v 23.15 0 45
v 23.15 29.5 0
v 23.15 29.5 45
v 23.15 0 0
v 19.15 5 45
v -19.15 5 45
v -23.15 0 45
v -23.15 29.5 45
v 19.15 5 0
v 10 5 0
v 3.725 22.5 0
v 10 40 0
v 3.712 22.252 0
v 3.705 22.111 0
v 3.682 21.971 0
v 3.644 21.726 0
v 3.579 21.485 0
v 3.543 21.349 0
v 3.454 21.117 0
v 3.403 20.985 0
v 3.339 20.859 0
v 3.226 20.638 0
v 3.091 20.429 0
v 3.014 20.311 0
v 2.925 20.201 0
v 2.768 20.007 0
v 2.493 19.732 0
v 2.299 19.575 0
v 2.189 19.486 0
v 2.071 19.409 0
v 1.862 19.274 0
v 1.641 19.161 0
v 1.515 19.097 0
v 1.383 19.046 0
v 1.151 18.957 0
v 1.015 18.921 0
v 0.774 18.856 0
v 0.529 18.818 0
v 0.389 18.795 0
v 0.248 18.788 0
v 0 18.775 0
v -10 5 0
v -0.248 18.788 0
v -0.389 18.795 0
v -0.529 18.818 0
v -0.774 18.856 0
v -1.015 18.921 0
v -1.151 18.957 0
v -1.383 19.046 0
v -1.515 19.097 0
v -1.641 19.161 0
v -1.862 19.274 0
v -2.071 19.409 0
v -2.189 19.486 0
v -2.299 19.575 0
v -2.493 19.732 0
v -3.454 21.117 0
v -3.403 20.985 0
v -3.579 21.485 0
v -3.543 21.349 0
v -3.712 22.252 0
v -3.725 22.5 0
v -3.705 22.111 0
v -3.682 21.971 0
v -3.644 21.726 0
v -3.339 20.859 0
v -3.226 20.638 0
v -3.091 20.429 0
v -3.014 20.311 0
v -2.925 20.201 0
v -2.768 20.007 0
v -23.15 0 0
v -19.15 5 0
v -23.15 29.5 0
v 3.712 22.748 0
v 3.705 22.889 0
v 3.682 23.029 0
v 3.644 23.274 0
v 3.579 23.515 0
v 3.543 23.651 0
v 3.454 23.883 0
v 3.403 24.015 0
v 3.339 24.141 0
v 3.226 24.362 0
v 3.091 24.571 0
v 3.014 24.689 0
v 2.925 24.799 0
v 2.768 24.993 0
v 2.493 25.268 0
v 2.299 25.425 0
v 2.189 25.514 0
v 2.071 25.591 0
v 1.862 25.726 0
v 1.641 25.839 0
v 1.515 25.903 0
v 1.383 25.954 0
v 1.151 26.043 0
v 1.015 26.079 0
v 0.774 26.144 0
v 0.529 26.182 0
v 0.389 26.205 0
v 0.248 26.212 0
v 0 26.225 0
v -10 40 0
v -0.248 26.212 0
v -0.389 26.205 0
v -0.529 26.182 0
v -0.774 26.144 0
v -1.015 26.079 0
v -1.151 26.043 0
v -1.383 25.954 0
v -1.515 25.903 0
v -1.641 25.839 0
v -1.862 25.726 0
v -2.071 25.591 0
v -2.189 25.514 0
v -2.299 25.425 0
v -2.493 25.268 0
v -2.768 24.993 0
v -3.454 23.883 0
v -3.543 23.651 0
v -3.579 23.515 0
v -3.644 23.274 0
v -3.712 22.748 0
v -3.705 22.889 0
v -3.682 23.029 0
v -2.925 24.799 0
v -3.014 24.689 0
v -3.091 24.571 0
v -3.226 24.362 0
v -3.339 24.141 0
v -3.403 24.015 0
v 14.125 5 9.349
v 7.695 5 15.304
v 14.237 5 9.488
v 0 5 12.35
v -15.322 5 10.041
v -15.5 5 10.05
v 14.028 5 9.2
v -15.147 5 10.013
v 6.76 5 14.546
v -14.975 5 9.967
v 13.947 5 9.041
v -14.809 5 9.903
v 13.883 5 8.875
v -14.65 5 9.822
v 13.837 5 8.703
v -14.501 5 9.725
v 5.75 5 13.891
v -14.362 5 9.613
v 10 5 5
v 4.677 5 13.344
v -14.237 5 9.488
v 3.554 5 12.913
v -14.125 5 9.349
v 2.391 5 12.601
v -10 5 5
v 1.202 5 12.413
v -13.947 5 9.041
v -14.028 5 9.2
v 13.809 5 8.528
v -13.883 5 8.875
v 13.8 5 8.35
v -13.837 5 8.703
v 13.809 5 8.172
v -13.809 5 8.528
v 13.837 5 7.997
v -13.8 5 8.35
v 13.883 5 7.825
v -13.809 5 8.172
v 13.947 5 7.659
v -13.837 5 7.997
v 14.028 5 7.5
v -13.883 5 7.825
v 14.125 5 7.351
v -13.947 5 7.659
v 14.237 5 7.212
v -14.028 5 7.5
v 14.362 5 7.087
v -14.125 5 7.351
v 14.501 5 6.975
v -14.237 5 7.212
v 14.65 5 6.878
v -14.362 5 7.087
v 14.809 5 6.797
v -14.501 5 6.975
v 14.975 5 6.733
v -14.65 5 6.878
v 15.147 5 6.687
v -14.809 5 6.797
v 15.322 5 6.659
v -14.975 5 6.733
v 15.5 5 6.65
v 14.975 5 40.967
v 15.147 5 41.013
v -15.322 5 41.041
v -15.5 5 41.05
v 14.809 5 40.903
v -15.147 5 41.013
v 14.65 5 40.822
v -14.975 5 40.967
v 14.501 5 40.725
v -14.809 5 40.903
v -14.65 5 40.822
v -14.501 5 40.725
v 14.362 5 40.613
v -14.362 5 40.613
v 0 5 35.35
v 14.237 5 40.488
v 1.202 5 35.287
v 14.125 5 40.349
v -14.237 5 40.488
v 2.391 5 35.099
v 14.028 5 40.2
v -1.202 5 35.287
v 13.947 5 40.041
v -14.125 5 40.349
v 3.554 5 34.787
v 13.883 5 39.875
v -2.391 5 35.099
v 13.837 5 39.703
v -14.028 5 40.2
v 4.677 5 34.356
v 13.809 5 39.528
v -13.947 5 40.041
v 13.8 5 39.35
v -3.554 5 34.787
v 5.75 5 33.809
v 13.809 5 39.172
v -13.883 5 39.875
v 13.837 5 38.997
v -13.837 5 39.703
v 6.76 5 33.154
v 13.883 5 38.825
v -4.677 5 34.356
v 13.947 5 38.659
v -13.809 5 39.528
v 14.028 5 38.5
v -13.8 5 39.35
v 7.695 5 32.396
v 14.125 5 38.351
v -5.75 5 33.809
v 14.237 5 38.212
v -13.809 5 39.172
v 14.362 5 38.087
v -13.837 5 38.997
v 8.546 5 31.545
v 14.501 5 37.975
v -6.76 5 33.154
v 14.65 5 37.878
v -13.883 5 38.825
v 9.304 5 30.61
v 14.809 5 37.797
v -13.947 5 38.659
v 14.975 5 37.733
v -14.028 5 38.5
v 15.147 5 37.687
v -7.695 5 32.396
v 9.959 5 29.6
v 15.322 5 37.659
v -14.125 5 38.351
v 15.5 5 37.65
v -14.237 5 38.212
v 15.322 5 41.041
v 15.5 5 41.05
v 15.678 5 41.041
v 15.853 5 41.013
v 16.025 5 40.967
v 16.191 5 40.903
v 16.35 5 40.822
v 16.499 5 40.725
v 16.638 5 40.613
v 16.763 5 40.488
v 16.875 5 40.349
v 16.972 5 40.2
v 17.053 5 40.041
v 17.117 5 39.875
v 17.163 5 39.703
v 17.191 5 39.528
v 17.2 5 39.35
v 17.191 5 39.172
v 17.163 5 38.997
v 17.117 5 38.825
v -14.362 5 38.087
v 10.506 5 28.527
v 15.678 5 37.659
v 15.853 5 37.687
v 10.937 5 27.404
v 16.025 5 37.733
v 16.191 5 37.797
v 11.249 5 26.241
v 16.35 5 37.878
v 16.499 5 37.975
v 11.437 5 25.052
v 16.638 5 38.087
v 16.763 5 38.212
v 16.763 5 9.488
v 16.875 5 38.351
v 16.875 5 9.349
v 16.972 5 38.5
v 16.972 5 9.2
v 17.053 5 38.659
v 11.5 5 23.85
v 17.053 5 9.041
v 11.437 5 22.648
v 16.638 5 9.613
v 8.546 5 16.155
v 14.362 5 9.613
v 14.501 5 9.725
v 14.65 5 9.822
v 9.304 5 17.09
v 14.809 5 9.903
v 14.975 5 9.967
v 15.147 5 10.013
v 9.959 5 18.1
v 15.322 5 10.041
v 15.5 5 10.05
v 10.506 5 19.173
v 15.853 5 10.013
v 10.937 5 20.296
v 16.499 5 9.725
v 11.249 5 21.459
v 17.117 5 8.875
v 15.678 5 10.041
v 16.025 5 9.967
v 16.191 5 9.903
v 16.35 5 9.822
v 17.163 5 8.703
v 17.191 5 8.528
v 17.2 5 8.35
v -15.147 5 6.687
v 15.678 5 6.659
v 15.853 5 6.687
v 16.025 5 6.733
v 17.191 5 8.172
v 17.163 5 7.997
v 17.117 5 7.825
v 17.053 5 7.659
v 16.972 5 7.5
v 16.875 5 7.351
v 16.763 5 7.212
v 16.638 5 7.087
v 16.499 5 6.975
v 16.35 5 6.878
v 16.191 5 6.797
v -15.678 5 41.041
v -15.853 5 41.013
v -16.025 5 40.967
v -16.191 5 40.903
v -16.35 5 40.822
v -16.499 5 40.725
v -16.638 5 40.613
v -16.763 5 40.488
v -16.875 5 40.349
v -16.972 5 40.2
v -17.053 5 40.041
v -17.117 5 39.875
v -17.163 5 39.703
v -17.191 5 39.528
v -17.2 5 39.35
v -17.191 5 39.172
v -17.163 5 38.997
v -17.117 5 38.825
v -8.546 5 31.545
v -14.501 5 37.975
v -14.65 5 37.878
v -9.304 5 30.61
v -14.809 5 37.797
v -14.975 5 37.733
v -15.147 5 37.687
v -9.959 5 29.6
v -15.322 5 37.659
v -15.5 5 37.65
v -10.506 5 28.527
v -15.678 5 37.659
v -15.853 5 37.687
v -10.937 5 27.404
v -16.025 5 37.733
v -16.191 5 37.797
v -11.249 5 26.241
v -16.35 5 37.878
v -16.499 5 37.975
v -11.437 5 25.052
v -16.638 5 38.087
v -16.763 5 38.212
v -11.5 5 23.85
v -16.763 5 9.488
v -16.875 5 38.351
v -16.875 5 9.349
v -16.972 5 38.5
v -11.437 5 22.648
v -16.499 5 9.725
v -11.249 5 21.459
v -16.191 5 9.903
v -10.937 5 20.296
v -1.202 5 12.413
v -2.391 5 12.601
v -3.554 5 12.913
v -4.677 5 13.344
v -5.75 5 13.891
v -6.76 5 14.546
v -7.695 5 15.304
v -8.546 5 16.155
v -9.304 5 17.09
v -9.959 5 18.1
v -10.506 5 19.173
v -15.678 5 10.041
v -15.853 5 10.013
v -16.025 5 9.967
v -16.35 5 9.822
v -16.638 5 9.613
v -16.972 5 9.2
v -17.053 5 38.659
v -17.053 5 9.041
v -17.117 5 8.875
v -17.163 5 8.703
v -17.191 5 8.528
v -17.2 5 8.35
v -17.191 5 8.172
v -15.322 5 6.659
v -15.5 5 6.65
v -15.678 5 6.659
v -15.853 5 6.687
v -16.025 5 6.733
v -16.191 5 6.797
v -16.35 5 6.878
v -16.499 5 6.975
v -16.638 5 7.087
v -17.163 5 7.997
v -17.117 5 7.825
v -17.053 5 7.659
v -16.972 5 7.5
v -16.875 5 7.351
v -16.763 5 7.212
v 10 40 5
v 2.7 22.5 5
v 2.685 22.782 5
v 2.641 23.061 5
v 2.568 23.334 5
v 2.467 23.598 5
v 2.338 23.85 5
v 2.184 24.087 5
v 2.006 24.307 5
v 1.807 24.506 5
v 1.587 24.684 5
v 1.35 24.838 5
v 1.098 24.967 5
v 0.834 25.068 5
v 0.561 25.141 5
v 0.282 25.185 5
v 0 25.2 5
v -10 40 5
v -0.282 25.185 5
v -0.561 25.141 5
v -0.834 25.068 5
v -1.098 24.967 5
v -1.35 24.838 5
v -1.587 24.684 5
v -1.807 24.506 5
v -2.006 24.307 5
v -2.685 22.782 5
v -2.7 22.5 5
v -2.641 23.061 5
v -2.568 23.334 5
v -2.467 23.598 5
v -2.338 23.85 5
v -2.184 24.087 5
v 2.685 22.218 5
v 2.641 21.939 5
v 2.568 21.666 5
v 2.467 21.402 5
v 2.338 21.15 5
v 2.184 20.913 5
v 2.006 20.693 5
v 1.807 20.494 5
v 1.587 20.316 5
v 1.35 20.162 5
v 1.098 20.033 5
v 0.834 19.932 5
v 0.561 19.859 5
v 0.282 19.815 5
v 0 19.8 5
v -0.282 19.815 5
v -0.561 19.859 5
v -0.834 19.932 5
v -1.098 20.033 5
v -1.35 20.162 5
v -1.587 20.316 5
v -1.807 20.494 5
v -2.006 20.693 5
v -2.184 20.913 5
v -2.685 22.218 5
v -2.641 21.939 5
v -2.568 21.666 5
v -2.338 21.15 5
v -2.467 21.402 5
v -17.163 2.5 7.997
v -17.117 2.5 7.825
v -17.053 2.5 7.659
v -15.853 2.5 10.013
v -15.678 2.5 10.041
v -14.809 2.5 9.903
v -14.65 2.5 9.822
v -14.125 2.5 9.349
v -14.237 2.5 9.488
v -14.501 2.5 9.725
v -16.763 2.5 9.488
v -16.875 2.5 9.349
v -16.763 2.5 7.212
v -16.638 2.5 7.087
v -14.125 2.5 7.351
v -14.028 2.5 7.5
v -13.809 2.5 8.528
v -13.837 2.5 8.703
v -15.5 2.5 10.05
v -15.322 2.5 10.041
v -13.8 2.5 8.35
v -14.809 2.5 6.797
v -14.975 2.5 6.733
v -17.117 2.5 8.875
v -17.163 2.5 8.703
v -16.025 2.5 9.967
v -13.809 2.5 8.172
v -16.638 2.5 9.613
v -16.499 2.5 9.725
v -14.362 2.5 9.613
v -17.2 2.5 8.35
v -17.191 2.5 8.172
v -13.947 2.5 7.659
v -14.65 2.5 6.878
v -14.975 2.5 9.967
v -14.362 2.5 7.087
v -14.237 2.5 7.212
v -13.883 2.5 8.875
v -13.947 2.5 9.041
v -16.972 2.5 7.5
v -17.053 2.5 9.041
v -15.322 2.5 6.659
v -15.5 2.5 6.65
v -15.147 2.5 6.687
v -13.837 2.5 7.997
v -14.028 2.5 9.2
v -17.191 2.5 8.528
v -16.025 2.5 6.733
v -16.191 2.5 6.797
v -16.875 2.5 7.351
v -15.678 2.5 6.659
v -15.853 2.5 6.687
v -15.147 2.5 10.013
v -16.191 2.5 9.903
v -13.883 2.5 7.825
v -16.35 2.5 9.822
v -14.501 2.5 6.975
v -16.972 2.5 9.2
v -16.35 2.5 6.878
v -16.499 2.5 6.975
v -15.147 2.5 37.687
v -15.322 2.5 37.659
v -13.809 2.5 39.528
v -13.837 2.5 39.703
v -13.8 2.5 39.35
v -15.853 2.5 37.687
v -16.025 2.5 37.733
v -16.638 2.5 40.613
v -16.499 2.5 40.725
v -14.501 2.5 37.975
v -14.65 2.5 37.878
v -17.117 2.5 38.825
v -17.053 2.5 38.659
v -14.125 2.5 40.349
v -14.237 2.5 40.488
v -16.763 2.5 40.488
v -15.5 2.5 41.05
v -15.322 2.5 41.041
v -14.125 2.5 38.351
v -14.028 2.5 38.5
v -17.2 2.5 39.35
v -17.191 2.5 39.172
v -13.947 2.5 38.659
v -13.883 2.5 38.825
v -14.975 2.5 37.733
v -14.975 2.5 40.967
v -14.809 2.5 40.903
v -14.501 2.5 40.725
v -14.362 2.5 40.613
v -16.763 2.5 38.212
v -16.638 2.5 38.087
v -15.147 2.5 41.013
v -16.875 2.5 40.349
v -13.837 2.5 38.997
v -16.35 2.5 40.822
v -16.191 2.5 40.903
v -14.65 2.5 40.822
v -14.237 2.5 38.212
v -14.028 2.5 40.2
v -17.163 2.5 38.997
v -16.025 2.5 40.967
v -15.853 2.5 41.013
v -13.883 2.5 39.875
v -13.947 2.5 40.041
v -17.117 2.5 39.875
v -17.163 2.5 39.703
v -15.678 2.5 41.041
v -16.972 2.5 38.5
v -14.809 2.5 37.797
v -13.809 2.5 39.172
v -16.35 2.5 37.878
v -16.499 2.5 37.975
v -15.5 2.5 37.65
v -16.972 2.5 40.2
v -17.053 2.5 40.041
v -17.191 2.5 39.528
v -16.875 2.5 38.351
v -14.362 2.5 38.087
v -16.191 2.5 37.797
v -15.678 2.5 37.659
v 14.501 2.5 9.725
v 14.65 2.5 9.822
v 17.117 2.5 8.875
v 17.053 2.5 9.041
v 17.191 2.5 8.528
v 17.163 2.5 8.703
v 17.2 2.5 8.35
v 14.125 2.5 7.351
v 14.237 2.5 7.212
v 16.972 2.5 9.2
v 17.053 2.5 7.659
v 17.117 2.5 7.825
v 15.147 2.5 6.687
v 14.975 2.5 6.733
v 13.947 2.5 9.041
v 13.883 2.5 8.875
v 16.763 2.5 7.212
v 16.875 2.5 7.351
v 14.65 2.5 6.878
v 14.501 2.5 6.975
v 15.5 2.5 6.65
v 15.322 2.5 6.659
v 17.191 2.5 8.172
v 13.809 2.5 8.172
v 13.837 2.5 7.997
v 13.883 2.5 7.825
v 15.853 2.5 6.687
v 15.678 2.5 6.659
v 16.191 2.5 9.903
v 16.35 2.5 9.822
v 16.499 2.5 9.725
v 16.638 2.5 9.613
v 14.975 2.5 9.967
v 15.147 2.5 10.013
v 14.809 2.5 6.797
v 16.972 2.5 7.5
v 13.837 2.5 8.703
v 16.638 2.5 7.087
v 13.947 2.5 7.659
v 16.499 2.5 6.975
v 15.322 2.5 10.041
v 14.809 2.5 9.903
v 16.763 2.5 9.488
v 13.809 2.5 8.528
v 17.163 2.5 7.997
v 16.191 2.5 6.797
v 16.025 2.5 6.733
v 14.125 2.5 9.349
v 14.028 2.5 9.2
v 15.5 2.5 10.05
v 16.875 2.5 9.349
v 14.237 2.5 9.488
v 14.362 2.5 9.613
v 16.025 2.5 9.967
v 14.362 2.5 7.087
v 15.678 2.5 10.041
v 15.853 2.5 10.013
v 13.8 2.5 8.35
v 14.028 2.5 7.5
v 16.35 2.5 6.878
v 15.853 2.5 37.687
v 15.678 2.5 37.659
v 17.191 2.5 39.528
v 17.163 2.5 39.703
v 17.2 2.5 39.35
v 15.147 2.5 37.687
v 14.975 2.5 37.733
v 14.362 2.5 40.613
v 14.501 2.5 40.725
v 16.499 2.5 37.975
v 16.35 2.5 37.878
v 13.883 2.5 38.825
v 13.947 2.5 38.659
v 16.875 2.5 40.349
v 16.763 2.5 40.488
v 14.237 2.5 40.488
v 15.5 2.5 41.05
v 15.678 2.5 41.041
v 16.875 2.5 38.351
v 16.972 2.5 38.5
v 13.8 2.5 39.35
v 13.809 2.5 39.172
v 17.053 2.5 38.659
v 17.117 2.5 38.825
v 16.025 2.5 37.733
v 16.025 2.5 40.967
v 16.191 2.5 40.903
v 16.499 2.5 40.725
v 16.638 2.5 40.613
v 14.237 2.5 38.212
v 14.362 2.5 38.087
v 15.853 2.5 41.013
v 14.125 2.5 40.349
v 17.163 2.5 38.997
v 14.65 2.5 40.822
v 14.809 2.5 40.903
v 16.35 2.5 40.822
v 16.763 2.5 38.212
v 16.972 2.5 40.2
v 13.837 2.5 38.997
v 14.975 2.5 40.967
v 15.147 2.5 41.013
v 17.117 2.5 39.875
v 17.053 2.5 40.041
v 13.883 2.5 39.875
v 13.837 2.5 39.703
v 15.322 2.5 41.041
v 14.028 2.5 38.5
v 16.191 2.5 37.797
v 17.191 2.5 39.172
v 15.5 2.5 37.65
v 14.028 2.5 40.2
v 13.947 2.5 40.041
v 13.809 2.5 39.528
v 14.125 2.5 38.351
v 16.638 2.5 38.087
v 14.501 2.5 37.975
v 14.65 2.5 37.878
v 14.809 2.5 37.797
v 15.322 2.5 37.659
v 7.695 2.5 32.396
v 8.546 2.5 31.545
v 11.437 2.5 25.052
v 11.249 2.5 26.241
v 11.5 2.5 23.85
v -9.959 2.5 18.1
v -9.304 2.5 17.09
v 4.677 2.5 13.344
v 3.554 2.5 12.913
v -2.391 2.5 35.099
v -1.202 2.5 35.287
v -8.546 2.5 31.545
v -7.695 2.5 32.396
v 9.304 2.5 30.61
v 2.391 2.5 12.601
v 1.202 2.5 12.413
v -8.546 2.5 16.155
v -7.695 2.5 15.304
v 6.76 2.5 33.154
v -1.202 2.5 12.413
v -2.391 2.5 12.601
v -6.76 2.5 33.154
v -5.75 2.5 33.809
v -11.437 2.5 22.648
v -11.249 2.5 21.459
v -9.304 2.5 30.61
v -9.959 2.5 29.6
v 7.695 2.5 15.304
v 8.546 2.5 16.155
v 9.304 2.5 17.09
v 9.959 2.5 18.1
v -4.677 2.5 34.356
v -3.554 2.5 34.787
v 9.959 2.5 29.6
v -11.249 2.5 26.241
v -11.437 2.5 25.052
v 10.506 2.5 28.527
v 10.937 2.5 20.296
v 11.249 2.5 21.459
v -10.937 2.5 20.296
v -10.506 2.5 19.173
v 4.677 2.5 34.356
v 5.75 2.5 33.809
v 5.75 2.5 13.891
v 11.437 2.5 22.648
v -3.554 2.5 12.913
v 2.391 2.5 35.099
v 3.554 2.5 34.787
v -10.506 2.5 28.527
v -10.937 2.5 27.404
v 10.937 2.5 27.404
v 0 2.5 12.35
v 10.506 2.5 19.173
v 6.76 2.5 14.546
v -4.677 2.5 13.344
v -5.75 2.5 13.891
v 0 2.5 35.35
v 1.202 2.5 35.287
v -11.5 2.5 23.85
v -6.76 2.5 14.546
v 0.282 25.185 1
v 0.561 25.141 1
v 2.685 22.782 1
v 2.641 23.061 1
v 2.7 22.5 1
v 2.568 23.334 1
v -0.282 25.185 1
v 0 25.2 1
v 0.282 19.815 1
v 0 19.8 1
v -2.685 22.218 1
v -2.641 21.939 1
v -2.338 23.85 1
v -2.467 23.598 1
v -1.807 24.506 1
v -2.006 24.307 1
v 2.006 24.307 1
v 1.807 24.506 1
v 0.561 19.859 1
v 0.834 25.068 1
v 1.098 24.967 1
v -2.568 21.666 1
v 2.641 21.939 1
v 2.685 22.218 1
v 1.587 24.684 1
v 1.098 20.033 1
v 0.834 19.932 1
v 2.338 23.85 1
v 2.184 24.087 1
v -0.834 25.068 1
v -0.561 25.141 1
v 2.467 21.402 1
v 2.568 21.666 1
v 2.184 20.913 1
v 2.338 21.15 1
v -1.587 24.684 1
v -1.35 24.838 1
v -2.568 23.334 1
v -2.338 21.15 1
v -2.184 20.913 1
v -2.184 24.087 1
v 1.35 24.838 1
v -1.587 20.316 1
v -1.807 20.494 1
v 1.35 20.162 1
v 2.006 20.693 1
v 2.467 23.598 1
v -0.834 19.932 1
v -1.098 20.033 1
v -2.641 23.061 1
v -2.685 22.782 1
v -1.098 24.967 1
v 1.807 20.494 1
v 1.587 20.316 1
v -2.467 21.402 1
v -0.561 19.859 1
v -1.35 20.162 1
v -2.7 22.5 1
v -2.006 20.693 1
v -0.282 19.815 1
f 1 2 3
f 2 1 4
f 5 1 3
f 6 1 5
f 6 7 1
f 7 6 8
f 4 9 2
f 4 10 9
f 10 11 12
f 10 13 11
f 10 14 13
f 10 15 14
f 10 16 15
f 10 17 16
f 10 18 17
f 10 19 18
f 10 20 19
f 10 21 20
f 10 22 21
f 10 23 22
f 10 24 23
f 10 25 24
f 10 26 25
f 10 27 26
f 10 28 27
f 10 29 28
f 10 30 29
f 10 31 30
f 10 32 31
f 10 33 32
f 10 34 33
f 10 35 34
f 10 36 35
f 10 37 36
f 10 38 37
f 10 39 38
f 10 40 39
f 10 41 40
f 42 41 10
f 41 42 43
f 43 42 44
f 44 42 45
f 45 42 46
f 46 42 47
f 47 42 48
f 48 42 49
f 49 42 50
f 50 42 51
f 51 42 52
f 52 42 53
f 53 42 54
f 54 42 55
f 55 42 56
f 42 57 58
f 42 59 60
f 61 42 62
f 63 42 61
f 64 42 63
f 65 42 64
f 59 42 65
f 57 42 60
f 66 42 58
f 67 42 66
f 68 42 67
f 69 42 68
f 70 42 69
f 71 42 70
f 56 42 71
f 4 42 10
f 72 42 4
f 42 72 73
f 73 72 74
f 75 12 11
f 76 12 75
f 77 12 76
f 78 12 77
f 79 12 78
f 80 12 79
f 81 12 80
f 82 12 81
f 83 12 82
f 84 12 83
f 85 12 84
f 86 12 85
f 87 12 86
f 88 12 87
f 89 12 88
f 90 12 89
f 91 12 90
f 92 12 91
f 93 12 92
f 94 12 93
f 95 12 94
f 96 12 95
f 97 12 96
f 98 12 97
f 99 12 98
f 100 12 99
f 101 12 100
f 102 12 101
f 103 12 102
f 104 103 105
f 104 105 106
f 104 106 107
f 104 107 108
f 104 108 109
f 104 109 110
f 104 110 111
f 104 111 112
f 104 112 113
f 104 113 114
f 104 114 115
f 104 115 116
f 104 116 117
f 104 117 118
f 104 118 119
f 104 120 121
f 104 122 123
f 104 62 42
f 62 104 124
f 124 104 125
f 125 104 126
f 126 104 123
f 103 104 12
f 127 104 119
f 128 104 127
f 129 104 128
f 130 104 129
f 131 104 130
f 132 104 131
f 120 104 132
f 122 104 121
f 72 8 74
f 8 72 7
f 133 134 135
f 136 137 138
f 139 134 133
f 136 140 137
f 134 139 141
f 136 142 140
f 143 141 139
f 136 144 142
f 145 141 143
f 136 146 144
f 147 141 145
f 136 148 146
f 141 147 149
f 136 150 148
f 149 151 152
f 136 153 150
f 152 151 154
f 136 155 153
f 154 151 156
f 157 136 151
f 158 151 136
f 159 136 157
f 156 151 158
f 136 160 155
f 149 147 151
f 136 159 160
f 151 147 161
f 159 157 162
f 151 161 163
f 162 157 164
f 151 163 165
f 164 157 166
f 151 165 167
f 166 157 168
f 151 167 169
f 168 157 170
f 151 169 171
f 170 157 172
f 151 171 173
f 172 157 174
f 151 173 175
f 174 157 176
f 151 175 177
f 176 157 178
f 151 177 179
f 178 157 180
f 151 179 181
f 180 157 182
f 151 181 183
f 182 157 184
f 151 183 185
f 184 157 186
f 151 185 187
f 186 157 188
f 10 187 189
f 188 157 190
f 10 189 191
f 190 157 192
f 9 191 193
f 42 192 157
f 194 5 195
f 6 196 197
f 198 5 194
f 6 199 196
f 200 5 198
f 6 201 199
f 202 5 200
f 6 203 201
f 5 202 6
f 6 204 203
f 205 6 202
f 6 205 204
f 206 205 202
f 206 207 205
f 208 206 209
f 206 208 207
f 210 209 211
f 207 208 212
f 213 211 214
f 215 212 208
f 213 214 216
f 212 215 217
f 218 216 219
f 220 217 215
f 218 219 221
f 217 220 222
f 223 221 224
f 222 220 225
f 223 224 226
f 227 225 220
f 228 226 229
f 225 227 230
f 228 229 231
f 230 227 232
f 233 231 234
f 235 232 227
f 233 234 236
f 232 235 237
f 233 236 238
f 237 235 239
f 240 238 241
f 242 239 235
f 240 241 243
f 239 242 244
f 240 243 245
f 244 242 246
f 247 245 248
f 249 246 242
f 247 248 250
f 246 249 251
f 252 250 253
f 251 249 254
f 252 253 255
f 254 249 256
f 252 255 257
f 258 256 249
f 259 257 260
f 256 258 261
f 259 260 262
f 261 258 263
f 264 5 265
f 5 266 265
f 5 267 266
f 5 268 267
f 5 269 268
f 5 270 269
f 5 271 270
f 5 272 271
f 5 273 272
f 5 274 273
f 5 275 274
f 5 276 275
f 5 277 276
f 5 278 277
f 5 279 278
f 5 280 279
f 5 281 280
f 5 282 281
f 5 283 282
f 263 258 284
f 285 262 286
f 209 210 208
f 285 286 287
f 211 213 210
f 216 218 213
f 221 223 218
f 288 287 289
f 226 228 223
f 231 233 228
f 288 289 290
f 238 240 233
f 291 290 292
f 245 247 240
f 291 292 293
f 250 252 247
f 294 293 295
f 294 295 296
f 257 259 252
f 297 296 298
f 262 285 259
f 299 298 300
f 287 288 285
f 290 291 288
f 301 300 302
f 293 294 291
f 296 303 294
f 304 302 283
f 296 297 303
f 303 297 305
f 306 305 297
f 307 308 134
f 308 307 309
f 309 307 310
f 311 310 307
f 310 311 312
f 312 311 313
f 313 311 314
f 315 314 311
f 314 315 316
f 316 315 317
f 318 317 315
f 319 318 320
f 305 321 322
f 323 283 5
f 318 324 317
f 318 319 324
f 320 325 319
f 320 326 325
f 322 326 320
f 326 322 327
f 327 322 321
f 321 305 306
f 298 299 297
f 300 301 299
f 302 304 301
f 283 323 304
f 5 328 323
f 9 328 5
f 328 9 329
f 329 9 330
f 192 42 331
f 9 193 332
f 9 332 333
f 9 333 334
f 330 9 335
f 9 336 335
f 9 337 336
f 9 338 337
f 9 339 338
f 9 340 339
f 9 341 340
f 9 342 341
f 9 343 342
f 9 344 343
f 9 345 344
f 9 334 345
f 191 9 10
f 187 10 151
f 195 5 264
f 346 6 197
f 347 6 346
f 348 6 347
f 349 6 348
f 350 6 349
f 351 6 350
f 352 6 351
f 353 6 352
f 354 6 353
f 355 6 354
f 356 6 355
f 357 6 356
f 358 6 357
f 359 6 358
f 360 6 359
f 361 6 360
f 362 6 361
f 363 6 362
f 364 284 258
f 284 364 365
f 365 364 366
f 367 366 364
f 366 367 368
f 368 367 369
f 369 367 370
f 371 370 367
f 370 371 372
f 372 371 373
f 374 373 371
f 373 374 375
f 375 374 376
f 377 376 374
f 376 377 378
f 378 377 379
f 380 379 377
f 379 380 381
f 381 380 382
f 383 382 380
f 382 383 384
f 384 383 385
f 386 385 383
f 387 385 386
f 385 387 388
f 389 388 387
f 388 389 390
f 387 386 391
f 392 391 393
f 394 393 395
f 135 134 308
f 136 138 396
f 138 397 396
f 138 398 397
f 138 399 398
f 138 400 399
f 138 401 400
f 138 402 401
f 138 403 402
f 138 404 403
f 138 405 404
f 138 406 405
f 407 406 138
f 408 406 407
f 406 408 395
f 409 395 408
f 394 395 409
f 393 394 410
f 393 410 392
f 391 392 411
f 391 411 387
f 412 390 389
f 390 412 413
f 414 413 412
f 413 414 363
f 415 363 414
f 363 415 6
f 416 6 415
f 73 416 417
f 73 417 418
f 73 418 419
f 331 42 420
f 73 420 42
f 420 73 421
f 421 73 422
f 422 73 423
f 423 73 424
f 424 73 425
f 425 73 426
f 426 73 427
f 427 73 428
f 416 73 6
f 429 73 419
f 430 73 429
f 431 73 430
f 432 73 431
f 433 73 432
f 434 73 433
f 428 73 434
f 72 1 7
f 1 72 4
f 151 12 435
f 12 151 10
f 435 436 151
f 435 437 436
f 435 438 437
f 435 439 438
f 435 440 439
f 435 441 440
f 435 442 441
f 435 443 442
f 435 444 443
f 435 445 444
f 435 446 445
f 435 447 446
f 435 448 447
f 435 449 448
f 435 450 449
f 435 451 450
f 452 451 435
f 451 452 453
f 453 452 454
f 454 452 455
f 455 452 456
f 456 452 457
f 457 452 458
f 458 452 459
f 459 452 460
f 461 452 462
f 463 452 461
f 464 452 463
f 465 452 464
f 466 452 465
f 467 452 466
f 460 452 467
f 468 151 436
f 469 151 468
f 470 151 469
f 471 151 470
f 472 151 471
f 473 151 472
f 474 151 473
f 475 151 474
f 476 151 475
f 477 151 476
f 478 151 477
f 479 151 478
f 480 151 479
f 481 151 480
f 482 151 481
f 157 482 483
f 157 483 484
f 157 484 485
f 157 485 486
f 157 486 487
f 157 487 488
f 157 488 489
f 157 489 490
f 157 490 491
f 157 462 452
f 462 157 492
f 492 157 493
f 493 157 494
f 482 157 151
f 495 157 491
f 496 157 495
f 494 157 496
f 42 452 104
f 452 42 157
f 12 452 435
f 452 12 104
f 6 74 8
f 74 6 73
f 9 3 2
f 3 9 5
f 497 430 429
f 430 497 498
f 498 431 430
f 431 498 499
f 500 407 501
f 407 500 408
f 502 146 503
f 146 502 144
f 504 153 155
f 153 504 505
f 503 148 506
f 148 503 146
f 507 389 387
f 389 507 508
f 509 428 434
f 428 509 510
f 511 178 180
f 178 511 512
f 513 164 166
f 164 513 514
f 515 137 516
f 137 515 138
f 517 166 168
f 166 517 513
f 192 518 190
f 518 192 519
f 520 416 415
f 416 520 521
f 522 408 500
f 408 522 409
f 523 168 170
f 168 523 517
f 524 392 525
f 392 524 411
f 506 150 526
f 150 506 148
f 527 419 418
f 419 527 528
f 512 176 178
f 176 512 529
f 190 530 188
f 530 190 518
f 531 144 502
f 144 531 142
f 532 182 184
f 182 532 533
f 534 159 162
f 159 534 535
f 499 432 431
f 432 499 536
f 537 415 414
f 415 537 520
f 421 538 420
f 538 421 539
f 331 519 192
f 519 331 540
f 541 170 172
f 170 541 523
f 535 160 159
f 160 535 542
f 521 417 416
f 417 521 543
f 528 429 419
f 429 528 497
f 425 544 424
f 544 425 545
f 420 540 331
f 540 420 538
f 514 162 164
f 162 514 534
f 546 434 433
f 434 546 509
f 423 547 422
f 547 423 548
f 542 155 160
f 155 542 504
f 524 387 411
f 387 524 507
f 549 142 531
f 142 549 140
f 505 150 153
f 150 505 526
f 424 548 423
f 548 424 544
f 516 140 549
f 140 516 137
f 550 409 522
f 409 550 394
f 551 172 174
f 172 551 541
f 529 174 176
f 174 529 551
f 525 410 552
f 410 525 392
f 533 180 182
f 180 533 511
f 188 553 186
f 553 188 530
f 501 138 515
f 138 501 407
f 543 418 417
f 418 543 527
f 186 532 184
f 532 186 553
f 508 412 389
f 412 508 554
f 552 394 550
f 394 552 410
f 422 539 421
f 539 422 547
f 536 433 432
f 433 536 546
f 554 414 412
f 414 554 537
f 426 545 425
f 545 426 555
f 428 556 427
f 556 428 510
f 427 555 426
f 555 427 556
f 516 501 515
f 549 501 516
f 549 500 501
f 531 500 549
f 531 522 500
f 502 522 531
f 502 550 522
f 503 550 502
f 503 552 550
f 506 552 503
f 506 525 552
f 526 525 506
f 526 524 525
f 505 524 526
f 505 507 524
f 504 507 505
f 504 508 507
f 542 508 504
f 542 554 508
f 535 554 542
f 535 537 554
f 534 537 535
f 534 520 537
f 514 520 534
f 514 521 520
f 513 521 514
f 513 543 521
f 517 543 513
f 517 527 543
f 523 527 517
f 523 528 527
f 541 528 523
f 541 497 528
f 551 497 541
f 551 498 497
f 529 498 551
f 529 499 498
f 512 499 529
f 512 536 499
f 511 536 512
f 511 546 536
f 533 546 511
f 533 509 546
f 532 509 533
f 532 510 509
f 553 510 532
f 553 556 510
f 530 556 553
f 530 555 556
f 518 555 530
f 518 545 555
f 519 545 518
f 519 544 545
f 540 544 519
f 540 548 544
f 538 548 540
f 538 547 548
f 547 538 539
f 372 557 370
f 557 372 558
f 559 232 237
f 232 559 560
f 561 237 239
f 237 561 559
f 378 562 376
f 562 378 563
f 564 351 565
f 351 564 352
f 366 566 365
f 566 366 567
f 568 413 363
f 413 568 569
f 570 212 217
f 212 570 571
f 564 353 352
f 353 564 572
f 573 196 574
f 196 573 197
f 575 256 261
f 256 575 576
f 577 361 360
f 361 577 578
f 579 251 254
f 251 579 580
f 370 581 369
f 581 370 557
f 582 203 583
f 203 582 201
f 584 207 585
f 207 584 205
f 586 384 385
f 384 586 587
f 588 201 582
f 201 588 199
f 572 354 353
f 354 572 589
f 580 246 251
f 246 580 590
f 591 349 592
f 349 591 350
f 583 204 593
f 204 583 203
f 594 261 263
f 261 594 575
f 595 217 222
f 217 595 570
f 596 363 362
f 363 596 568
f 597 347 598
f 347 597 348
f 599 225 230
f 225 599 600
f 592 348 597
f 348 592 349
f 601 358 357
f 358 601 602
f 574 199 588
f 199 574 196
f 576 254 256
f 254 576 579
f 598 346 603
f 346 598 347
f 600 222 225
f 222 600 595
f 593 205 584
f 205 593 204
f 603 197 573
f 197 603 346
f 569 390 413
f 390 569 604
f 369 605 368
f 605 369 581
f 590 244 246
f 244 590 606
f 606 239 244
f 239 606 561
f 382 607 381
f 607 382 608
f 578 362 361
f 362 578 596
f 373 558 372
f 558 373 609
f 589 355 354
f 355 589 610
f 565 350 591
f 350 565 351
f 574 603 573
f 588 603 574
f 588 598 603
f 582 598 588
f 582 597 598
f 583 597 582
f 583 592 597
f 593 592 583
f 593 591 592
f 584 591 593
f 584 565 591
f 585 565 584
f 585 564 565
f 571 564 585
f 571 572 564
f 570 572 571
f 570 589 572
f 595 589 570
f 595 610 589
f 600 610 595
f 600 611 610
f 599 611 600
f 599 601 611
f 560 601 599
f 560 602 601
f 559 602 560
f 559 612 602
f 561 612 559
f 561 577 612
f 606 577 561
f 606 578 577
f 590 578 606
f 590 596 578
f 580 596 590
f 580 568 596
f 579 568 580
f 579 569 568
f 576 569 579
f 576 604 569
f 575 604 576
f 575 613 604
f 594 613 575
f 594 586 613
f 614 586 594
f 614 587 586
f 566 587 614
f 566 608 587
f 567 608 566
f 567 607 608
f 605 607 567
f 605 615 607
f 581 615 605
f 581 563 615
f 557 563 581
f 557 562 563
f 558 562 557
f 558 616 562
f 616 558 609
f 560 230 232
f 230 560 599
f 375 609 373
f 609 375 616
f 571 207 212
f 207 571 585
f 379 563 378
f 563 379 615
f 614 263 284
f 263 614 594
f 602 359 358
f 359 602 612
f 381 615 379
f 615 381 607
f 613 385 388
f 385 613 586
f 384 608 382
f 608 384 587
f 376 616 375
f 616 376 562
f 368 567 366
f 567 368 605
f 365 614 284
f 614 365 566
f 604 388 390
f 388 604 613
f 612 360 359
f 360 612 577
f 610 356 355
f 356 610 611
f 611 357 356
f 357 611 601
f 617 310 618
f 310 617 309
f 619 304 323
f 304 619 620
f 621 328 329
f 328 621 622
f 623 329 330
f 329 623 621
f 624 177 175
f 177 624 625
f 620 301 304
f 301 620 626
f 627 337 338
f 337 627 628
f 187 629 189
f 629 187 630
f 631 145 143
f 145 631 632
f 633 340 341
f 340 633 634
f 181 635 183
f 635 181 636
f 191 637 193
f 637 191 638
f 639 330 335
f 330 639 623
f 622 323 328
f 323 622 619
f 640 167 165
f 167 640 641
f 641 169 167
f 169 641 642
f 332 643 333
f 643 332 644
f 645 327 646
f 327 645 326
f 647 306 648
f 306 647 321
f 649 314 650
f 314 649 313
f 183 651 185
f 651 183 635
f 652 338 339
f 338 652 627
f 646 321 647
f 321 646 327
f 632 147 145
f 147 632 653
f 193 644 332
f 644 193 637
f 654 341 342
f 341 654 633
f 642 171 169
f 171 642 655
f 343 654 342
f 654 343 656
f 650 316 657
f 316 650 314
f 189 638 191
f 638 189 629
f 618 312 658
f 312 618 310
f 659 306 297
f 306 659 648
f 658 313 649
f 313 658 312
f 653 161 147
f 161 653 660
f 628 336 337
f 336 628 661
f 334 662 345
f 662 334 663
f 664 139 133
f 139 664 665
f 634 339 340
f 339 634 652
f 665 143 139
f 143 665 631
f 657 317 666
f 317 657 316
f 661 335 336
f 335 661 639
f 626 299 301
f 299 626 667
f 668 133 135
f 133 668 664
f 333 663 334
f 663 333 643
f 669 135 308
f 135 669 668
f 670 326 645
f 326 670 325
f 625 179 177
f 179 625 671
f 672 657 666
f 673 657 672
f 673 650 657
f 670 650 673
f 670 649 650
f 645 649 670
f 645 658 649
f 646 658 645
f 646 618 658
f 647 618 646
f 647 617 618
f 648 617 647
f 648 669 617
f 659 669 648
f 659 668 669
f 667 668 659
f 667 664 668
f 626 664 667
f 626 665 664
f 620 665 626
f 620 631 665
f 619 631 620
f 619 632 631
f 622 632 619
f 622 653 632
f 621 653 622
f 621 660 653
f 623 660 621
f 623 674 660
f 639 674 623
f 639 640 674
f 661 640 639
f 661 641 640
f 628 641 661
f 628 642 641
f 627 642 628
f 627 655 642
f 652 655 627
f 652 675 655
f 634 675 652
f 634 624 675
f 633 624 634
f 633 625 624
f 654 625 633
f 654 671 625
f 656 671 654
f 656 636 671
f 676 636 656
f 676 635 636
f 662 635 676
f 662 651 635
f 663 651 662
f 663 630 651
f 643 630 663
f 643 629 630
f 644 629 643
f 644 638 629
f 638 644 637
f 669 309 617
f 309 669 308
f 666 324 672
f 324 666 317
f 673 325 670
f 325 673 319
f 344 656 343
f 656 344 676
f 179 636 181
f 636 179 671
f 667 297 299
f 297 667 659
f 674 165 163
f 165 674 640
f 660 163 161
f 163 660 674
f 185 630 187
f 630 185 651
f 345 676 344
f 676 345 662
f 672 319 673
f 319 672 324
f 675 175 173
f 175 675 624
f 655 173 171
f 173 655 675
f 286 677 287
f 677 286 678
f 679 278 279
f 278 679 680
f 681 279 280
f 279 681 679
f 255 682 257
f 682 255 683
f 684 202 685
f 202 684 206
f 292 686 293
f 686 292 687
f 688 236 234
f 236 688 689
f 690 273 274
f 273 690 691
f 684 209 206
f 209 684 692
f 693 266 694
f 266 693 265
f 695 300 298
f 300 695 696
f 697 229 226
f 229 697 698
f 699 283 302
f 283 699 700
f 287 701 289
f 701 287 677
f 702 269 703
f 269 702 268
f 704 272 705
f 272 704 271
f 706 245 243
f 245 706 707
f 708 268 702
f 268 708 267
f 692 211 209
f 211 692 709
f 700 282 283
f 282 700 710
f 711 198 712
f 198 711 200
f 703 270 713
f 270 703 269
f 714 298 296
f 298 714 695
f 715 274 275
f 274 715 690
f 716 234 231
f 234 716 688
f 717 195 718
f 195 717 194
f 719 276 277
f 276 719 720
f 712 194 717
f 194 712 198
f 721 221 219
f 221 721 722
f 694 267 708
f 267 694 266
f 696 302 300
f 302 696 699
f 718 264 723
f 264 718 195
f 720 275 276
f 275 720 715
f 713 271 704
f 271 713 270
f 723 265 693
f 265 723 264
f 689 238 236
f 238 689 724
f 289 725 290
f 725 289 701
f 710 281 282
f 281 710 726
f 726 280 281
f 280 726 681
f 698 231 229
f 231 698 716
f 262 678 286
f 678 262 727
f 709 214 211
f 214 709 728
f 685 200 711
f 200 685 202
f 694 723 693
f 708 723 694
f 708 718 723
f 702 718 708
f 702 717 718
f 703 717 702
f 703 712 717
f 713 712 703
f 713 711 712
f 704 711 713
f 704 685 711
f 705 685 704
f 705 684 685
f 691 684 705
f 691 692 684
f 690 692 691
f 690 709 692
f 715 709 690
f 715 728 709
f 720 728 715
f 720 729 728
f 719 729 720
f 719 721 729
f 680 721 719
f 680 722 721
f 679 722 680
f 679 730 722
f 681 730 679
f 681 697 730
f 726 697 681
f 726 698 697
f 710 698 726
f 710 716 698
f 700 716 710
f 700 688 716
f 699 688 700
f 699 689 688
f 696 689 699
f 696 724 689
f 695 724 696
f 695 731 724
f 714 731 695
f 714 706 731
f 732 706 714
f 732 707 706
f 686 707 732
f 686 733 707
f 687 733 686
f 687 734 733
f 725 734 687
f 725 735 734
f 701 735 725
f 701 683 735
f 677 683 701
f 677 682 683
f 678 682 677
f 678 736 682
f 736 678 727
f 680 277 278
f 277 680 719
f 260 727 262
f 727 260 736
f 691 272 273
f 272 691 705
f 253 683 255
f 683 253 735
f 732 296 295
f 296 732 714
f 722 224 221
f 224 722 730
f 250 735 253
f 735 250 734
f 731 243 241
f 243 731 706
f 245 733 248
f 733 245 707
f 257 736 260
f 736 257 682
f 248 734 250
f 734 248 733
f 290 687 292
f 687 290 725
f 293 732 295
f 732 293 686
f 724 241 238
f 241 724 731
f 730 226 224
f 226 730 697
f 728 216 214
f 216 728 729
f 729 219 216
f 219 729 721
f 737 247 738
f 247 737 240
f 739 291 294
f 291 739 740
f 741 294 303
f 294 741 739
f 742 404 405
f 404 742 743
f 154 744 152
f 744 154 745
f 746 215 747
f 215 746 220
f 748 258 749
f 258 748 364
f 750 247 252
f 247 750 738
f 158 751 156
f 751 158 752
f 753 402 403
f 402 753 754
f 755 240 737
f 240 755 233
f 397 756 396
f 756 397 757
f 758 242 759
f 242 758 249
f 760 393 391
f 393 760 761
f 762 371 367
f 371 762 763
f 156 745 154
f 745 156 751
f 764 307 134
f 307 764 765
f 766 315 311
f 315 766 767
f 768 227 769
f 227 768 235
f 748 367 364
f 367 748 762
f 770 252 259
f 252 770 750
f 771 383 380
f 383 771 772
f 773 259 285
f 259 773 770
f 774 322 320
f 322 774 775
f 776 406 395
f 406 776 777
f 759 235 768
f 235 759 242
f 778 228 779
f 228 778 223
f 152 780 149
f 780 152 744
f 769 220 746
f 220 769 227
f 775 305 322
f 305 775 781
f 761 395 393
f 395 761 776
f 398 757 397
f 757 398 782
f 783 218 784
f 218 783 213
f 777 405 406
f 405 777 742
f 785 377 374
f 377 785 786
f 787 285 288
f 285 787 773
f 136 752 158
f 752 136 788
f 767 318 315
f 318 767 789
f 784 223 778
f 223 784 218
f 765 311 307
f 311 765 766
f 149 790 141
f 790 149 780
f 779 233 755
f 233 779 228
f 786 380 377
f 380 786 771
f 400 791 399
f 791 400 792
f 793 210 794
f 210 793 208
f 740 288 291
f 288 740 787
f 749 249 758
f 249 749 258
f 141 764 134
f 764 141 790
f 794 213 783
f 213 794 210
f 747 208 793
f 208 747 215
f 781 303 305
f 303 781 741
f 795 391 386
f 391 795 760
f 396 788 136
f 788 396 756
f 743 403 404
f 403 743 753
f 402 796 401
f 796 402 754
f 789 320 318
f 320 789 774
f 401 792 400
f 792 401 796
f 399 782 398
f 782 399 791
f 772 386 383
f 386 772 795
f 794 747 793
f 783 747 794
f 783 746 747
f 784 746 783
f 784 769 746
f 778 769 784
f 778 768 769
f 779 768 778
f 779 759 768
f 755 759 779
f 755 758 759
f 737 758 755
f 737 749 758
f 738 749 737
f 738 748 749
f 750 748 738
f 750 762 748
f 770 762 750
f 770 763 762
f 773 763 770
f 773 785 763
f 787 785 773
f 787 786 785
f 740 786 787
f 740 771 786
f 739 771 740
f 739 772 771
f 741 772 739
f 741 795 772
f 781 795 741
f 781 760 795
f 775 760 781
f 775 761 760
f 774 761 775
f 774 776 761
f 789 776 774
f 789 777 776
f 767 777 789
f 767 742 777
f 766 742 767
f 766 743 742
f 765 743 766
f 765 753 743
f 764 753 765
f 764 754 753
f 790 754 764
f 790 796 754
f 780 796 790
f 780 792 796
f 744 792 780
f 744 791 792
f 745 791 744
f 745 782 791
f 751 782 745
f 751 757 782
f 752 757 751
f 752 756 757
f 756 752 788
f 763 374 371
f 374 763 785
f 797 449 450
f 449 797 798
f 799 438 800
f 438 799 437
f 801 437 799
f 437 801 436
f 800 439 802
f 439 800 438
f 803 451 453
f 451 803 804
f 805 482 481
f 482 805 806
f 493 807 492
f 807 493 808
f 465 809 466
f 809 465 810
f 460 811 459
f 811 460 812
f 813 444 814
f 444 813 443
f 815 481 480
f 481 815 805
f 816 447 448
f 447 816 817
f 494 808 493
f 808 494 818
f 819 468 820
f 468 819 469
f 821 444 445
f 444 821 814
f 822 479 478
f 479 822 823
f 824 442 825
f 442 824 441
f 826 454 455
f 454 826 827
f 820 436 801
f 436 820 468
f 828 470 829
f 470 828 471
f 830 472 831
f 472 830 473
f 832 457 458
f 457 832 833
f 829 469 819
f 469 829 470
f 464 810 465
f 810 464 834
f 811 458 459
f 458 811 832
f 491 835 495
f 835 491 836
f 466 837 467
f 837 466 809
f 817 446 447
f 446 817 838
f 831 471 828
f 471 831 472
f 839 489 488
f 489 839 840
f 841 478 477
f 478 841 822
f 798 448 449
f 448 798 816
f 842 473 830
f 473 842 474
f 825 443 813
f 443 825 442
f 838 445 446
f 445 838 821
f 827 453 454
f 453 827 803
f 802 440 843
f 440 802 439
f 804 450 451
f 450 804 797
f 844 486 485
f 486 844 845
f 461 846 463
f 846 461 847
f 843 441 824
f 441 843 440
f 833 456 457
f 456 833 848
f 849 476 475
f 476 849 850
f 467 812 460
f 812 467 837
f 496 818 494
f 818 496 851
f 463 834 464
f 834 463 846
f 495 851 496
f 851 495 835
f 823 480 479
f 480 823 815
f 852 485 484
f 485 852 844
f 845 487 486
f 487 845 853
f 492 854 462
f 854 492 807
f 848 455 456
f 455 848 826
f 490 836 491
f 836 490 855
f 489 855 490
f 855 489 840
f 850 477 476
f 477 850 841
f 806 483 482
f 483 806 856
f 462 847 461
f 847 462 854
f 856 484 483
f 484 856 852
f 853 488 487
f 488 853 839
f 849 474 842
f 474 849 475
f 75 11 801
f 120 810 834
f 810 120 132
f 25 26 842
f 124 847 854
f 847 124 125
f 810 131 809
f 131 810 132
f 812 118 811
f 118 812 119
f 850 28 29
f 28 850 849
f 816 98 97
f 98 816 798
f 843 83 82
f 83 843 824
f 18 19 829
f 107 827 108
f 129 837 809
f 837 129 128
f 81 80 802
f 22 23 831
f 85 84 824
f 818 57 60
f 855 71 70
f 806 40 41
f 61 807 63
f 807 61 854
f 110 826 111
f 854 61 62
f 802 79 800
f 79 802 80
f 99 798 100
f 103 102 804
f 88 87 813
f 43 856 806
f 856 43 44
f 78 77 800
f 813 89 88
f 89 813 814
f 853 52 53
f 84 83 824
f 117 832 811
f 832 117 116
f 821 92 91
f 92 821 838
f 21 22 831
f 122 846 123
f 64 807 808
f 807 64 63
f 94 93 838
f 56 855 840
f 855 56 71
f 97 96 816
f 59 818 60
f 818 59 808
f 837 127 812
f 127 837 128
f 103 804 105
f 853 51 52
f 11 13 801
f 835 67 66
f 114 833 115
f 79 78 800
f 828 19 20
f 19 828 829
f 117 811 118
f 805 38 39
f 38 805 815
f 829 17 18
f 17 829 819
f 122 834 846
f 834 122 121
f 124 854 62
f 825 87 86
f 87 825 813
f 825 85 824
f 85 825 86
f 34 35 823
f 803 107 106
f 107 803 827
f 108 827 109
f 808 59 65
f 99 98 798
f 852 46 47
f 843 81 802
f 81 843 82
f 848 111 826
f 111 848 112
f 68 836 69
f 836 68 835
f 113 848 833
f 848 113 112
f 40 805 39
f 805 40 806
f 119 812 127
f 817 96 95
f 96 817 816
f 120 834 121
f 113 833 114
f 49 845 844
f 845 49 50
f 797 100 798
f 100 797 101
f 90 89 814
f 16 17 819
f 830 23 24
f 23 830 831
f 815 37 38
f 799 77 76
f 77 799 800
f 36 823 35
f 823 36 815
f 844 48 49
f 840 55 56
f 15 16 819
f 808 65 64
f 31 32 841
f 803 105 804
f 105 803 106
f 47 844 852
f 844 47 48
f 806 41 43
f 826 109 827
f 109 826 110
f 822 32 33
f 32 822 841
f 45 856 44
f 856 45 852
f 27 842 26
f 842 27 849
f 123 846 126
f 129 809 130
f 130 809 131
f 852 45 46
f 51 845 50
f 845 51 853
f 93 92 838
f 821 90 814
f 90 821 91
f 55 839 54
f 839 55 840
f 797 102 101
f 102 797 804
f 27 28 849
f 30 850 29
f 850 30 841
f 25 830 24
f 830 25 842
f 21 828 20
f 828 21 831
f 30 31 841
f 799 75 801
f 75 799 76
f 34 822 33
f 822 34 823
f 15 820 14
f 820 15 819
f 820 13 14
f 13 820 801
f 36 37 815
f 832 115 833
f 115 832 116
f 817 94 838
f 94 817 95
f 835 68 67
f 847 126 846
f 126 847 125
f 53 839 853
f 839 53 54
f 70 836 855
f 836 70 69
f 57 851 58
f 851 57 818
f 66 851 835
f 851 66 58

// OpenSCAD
// ==============================================================================
// TFG: BANCO MECATRÓNICO DE MICROGRAVEDAD SIMULADA
// Componente: Soporte de Motor Paso a Paso NEMA 17 para Extremo de Perfil 2020
// Aplicación: Transmisión por Correa GT2 del Carro Transversal
// Diseñado para: Fabricación Aditiva FDM (PLA/PETG/ABS) con DFAM
// ==============================================================================

$fn = 60;

// --- Parámetros Motor NEMA 17 ---
nema_side        = 42.3;  // Ancho nominal NEMA 17 (mm)
nema_hole_pitch  = 31.0;  // Distancia entre centros de taladros M3 (mm)
nema_pilot_dia   = 23.0;  // Diámetro del resalte central (mm, con holgura)
m3_pass_dia      = 3.4;   // Taladro pasante M3 (+0.4 mm holgura)

// --- Parámetros Perfil V-Slot / T-Slot 2020 ---
profile_width    = 20.0;  // Ancho del perfil (mm)
m5_pass_dia      = 5.4;   // Taladro pasante M5 para tuerca T (+0.4 mm)
m5_head_dia      = 9.5;   // Alojamiento para cabeza de tornillo M5

// --- Parámetros del Soporte ---
wall_thick       = 5.0;   // Espesor estructural de paredes (mm)
flange_len       = 35.0;  // Longitud de las alas de sujeción al perfil (mm)
base_width       = nema_side + 4.0;
bracket_depth    = 45.0;  // Altura total del soporte

module soporte_motor_nema17() {
    difference() {
        union() {
            // Placa frontal de montaje del motor
            translate([-base_width/2, 0, 0])
                cube([base_width, wall_thick, bracket_depth]);
            
            // Alas de fijación laterales al perfil 2020 (en ángulo de 90°)
            translate([-profile_width/2, wall_thick, 0])
                cube([profile_width, flange_len, wall_thick]);
            
            // Cartelas de refuerzo triangulares para rigidez frente a la tensión de la correa
            translate([-base_width/2, wall_thick, 0])
                linear_extrude(height = bracket_depth)
                    polygon(points = [[0, 0], [4, 0], [0, flange_len * 0.7]]);
            
            translate([base_width/2 - 4, wall_thick, 0])
                linear_extrude(height = bracket_depth)
                    polygon(points = [[4, 0], [0, 0], [4, flange_len * 0.7]]);
        }

        // --- Taladros NEMA 17 en la placa vertical ---
        translate([0, wall_thick + 1, bracket_depth - nema_side/2]) {
            rotate([90, 0, 0]) {
                // Cuello central del motor
                cylinder(d = nema_pilot_dia, h = wall_thick + 2, center = true);
                
                // 4 taladros de fijación M3
                for (dx = [-nema_hole_pitch/2, nema_hole_pitch/2]) {
                    for (dz = [-nema_hole_pitch/2, nema_hole_pitch/2]) {
                        translate([dx, dz, 0])
                            cylinder(d = m3_pass_dia, h = wall_thick + 2, center = true);
                    }
                }
            }
        }

        // --- Taladros M5 de fijación a la ranura del perfil 2020 ---
        translate([0, wall_thick + flange_len/2, -1]) {
            cylinder(d = m5_pass_dia, h = wall_thick + 2);
            // Chaflán inferior
            cylinder(d1 = m5_head_dia, d2 = m5_pass_dia, h = 2.0);
        }
    }
}

soporte_motor_nema17();
